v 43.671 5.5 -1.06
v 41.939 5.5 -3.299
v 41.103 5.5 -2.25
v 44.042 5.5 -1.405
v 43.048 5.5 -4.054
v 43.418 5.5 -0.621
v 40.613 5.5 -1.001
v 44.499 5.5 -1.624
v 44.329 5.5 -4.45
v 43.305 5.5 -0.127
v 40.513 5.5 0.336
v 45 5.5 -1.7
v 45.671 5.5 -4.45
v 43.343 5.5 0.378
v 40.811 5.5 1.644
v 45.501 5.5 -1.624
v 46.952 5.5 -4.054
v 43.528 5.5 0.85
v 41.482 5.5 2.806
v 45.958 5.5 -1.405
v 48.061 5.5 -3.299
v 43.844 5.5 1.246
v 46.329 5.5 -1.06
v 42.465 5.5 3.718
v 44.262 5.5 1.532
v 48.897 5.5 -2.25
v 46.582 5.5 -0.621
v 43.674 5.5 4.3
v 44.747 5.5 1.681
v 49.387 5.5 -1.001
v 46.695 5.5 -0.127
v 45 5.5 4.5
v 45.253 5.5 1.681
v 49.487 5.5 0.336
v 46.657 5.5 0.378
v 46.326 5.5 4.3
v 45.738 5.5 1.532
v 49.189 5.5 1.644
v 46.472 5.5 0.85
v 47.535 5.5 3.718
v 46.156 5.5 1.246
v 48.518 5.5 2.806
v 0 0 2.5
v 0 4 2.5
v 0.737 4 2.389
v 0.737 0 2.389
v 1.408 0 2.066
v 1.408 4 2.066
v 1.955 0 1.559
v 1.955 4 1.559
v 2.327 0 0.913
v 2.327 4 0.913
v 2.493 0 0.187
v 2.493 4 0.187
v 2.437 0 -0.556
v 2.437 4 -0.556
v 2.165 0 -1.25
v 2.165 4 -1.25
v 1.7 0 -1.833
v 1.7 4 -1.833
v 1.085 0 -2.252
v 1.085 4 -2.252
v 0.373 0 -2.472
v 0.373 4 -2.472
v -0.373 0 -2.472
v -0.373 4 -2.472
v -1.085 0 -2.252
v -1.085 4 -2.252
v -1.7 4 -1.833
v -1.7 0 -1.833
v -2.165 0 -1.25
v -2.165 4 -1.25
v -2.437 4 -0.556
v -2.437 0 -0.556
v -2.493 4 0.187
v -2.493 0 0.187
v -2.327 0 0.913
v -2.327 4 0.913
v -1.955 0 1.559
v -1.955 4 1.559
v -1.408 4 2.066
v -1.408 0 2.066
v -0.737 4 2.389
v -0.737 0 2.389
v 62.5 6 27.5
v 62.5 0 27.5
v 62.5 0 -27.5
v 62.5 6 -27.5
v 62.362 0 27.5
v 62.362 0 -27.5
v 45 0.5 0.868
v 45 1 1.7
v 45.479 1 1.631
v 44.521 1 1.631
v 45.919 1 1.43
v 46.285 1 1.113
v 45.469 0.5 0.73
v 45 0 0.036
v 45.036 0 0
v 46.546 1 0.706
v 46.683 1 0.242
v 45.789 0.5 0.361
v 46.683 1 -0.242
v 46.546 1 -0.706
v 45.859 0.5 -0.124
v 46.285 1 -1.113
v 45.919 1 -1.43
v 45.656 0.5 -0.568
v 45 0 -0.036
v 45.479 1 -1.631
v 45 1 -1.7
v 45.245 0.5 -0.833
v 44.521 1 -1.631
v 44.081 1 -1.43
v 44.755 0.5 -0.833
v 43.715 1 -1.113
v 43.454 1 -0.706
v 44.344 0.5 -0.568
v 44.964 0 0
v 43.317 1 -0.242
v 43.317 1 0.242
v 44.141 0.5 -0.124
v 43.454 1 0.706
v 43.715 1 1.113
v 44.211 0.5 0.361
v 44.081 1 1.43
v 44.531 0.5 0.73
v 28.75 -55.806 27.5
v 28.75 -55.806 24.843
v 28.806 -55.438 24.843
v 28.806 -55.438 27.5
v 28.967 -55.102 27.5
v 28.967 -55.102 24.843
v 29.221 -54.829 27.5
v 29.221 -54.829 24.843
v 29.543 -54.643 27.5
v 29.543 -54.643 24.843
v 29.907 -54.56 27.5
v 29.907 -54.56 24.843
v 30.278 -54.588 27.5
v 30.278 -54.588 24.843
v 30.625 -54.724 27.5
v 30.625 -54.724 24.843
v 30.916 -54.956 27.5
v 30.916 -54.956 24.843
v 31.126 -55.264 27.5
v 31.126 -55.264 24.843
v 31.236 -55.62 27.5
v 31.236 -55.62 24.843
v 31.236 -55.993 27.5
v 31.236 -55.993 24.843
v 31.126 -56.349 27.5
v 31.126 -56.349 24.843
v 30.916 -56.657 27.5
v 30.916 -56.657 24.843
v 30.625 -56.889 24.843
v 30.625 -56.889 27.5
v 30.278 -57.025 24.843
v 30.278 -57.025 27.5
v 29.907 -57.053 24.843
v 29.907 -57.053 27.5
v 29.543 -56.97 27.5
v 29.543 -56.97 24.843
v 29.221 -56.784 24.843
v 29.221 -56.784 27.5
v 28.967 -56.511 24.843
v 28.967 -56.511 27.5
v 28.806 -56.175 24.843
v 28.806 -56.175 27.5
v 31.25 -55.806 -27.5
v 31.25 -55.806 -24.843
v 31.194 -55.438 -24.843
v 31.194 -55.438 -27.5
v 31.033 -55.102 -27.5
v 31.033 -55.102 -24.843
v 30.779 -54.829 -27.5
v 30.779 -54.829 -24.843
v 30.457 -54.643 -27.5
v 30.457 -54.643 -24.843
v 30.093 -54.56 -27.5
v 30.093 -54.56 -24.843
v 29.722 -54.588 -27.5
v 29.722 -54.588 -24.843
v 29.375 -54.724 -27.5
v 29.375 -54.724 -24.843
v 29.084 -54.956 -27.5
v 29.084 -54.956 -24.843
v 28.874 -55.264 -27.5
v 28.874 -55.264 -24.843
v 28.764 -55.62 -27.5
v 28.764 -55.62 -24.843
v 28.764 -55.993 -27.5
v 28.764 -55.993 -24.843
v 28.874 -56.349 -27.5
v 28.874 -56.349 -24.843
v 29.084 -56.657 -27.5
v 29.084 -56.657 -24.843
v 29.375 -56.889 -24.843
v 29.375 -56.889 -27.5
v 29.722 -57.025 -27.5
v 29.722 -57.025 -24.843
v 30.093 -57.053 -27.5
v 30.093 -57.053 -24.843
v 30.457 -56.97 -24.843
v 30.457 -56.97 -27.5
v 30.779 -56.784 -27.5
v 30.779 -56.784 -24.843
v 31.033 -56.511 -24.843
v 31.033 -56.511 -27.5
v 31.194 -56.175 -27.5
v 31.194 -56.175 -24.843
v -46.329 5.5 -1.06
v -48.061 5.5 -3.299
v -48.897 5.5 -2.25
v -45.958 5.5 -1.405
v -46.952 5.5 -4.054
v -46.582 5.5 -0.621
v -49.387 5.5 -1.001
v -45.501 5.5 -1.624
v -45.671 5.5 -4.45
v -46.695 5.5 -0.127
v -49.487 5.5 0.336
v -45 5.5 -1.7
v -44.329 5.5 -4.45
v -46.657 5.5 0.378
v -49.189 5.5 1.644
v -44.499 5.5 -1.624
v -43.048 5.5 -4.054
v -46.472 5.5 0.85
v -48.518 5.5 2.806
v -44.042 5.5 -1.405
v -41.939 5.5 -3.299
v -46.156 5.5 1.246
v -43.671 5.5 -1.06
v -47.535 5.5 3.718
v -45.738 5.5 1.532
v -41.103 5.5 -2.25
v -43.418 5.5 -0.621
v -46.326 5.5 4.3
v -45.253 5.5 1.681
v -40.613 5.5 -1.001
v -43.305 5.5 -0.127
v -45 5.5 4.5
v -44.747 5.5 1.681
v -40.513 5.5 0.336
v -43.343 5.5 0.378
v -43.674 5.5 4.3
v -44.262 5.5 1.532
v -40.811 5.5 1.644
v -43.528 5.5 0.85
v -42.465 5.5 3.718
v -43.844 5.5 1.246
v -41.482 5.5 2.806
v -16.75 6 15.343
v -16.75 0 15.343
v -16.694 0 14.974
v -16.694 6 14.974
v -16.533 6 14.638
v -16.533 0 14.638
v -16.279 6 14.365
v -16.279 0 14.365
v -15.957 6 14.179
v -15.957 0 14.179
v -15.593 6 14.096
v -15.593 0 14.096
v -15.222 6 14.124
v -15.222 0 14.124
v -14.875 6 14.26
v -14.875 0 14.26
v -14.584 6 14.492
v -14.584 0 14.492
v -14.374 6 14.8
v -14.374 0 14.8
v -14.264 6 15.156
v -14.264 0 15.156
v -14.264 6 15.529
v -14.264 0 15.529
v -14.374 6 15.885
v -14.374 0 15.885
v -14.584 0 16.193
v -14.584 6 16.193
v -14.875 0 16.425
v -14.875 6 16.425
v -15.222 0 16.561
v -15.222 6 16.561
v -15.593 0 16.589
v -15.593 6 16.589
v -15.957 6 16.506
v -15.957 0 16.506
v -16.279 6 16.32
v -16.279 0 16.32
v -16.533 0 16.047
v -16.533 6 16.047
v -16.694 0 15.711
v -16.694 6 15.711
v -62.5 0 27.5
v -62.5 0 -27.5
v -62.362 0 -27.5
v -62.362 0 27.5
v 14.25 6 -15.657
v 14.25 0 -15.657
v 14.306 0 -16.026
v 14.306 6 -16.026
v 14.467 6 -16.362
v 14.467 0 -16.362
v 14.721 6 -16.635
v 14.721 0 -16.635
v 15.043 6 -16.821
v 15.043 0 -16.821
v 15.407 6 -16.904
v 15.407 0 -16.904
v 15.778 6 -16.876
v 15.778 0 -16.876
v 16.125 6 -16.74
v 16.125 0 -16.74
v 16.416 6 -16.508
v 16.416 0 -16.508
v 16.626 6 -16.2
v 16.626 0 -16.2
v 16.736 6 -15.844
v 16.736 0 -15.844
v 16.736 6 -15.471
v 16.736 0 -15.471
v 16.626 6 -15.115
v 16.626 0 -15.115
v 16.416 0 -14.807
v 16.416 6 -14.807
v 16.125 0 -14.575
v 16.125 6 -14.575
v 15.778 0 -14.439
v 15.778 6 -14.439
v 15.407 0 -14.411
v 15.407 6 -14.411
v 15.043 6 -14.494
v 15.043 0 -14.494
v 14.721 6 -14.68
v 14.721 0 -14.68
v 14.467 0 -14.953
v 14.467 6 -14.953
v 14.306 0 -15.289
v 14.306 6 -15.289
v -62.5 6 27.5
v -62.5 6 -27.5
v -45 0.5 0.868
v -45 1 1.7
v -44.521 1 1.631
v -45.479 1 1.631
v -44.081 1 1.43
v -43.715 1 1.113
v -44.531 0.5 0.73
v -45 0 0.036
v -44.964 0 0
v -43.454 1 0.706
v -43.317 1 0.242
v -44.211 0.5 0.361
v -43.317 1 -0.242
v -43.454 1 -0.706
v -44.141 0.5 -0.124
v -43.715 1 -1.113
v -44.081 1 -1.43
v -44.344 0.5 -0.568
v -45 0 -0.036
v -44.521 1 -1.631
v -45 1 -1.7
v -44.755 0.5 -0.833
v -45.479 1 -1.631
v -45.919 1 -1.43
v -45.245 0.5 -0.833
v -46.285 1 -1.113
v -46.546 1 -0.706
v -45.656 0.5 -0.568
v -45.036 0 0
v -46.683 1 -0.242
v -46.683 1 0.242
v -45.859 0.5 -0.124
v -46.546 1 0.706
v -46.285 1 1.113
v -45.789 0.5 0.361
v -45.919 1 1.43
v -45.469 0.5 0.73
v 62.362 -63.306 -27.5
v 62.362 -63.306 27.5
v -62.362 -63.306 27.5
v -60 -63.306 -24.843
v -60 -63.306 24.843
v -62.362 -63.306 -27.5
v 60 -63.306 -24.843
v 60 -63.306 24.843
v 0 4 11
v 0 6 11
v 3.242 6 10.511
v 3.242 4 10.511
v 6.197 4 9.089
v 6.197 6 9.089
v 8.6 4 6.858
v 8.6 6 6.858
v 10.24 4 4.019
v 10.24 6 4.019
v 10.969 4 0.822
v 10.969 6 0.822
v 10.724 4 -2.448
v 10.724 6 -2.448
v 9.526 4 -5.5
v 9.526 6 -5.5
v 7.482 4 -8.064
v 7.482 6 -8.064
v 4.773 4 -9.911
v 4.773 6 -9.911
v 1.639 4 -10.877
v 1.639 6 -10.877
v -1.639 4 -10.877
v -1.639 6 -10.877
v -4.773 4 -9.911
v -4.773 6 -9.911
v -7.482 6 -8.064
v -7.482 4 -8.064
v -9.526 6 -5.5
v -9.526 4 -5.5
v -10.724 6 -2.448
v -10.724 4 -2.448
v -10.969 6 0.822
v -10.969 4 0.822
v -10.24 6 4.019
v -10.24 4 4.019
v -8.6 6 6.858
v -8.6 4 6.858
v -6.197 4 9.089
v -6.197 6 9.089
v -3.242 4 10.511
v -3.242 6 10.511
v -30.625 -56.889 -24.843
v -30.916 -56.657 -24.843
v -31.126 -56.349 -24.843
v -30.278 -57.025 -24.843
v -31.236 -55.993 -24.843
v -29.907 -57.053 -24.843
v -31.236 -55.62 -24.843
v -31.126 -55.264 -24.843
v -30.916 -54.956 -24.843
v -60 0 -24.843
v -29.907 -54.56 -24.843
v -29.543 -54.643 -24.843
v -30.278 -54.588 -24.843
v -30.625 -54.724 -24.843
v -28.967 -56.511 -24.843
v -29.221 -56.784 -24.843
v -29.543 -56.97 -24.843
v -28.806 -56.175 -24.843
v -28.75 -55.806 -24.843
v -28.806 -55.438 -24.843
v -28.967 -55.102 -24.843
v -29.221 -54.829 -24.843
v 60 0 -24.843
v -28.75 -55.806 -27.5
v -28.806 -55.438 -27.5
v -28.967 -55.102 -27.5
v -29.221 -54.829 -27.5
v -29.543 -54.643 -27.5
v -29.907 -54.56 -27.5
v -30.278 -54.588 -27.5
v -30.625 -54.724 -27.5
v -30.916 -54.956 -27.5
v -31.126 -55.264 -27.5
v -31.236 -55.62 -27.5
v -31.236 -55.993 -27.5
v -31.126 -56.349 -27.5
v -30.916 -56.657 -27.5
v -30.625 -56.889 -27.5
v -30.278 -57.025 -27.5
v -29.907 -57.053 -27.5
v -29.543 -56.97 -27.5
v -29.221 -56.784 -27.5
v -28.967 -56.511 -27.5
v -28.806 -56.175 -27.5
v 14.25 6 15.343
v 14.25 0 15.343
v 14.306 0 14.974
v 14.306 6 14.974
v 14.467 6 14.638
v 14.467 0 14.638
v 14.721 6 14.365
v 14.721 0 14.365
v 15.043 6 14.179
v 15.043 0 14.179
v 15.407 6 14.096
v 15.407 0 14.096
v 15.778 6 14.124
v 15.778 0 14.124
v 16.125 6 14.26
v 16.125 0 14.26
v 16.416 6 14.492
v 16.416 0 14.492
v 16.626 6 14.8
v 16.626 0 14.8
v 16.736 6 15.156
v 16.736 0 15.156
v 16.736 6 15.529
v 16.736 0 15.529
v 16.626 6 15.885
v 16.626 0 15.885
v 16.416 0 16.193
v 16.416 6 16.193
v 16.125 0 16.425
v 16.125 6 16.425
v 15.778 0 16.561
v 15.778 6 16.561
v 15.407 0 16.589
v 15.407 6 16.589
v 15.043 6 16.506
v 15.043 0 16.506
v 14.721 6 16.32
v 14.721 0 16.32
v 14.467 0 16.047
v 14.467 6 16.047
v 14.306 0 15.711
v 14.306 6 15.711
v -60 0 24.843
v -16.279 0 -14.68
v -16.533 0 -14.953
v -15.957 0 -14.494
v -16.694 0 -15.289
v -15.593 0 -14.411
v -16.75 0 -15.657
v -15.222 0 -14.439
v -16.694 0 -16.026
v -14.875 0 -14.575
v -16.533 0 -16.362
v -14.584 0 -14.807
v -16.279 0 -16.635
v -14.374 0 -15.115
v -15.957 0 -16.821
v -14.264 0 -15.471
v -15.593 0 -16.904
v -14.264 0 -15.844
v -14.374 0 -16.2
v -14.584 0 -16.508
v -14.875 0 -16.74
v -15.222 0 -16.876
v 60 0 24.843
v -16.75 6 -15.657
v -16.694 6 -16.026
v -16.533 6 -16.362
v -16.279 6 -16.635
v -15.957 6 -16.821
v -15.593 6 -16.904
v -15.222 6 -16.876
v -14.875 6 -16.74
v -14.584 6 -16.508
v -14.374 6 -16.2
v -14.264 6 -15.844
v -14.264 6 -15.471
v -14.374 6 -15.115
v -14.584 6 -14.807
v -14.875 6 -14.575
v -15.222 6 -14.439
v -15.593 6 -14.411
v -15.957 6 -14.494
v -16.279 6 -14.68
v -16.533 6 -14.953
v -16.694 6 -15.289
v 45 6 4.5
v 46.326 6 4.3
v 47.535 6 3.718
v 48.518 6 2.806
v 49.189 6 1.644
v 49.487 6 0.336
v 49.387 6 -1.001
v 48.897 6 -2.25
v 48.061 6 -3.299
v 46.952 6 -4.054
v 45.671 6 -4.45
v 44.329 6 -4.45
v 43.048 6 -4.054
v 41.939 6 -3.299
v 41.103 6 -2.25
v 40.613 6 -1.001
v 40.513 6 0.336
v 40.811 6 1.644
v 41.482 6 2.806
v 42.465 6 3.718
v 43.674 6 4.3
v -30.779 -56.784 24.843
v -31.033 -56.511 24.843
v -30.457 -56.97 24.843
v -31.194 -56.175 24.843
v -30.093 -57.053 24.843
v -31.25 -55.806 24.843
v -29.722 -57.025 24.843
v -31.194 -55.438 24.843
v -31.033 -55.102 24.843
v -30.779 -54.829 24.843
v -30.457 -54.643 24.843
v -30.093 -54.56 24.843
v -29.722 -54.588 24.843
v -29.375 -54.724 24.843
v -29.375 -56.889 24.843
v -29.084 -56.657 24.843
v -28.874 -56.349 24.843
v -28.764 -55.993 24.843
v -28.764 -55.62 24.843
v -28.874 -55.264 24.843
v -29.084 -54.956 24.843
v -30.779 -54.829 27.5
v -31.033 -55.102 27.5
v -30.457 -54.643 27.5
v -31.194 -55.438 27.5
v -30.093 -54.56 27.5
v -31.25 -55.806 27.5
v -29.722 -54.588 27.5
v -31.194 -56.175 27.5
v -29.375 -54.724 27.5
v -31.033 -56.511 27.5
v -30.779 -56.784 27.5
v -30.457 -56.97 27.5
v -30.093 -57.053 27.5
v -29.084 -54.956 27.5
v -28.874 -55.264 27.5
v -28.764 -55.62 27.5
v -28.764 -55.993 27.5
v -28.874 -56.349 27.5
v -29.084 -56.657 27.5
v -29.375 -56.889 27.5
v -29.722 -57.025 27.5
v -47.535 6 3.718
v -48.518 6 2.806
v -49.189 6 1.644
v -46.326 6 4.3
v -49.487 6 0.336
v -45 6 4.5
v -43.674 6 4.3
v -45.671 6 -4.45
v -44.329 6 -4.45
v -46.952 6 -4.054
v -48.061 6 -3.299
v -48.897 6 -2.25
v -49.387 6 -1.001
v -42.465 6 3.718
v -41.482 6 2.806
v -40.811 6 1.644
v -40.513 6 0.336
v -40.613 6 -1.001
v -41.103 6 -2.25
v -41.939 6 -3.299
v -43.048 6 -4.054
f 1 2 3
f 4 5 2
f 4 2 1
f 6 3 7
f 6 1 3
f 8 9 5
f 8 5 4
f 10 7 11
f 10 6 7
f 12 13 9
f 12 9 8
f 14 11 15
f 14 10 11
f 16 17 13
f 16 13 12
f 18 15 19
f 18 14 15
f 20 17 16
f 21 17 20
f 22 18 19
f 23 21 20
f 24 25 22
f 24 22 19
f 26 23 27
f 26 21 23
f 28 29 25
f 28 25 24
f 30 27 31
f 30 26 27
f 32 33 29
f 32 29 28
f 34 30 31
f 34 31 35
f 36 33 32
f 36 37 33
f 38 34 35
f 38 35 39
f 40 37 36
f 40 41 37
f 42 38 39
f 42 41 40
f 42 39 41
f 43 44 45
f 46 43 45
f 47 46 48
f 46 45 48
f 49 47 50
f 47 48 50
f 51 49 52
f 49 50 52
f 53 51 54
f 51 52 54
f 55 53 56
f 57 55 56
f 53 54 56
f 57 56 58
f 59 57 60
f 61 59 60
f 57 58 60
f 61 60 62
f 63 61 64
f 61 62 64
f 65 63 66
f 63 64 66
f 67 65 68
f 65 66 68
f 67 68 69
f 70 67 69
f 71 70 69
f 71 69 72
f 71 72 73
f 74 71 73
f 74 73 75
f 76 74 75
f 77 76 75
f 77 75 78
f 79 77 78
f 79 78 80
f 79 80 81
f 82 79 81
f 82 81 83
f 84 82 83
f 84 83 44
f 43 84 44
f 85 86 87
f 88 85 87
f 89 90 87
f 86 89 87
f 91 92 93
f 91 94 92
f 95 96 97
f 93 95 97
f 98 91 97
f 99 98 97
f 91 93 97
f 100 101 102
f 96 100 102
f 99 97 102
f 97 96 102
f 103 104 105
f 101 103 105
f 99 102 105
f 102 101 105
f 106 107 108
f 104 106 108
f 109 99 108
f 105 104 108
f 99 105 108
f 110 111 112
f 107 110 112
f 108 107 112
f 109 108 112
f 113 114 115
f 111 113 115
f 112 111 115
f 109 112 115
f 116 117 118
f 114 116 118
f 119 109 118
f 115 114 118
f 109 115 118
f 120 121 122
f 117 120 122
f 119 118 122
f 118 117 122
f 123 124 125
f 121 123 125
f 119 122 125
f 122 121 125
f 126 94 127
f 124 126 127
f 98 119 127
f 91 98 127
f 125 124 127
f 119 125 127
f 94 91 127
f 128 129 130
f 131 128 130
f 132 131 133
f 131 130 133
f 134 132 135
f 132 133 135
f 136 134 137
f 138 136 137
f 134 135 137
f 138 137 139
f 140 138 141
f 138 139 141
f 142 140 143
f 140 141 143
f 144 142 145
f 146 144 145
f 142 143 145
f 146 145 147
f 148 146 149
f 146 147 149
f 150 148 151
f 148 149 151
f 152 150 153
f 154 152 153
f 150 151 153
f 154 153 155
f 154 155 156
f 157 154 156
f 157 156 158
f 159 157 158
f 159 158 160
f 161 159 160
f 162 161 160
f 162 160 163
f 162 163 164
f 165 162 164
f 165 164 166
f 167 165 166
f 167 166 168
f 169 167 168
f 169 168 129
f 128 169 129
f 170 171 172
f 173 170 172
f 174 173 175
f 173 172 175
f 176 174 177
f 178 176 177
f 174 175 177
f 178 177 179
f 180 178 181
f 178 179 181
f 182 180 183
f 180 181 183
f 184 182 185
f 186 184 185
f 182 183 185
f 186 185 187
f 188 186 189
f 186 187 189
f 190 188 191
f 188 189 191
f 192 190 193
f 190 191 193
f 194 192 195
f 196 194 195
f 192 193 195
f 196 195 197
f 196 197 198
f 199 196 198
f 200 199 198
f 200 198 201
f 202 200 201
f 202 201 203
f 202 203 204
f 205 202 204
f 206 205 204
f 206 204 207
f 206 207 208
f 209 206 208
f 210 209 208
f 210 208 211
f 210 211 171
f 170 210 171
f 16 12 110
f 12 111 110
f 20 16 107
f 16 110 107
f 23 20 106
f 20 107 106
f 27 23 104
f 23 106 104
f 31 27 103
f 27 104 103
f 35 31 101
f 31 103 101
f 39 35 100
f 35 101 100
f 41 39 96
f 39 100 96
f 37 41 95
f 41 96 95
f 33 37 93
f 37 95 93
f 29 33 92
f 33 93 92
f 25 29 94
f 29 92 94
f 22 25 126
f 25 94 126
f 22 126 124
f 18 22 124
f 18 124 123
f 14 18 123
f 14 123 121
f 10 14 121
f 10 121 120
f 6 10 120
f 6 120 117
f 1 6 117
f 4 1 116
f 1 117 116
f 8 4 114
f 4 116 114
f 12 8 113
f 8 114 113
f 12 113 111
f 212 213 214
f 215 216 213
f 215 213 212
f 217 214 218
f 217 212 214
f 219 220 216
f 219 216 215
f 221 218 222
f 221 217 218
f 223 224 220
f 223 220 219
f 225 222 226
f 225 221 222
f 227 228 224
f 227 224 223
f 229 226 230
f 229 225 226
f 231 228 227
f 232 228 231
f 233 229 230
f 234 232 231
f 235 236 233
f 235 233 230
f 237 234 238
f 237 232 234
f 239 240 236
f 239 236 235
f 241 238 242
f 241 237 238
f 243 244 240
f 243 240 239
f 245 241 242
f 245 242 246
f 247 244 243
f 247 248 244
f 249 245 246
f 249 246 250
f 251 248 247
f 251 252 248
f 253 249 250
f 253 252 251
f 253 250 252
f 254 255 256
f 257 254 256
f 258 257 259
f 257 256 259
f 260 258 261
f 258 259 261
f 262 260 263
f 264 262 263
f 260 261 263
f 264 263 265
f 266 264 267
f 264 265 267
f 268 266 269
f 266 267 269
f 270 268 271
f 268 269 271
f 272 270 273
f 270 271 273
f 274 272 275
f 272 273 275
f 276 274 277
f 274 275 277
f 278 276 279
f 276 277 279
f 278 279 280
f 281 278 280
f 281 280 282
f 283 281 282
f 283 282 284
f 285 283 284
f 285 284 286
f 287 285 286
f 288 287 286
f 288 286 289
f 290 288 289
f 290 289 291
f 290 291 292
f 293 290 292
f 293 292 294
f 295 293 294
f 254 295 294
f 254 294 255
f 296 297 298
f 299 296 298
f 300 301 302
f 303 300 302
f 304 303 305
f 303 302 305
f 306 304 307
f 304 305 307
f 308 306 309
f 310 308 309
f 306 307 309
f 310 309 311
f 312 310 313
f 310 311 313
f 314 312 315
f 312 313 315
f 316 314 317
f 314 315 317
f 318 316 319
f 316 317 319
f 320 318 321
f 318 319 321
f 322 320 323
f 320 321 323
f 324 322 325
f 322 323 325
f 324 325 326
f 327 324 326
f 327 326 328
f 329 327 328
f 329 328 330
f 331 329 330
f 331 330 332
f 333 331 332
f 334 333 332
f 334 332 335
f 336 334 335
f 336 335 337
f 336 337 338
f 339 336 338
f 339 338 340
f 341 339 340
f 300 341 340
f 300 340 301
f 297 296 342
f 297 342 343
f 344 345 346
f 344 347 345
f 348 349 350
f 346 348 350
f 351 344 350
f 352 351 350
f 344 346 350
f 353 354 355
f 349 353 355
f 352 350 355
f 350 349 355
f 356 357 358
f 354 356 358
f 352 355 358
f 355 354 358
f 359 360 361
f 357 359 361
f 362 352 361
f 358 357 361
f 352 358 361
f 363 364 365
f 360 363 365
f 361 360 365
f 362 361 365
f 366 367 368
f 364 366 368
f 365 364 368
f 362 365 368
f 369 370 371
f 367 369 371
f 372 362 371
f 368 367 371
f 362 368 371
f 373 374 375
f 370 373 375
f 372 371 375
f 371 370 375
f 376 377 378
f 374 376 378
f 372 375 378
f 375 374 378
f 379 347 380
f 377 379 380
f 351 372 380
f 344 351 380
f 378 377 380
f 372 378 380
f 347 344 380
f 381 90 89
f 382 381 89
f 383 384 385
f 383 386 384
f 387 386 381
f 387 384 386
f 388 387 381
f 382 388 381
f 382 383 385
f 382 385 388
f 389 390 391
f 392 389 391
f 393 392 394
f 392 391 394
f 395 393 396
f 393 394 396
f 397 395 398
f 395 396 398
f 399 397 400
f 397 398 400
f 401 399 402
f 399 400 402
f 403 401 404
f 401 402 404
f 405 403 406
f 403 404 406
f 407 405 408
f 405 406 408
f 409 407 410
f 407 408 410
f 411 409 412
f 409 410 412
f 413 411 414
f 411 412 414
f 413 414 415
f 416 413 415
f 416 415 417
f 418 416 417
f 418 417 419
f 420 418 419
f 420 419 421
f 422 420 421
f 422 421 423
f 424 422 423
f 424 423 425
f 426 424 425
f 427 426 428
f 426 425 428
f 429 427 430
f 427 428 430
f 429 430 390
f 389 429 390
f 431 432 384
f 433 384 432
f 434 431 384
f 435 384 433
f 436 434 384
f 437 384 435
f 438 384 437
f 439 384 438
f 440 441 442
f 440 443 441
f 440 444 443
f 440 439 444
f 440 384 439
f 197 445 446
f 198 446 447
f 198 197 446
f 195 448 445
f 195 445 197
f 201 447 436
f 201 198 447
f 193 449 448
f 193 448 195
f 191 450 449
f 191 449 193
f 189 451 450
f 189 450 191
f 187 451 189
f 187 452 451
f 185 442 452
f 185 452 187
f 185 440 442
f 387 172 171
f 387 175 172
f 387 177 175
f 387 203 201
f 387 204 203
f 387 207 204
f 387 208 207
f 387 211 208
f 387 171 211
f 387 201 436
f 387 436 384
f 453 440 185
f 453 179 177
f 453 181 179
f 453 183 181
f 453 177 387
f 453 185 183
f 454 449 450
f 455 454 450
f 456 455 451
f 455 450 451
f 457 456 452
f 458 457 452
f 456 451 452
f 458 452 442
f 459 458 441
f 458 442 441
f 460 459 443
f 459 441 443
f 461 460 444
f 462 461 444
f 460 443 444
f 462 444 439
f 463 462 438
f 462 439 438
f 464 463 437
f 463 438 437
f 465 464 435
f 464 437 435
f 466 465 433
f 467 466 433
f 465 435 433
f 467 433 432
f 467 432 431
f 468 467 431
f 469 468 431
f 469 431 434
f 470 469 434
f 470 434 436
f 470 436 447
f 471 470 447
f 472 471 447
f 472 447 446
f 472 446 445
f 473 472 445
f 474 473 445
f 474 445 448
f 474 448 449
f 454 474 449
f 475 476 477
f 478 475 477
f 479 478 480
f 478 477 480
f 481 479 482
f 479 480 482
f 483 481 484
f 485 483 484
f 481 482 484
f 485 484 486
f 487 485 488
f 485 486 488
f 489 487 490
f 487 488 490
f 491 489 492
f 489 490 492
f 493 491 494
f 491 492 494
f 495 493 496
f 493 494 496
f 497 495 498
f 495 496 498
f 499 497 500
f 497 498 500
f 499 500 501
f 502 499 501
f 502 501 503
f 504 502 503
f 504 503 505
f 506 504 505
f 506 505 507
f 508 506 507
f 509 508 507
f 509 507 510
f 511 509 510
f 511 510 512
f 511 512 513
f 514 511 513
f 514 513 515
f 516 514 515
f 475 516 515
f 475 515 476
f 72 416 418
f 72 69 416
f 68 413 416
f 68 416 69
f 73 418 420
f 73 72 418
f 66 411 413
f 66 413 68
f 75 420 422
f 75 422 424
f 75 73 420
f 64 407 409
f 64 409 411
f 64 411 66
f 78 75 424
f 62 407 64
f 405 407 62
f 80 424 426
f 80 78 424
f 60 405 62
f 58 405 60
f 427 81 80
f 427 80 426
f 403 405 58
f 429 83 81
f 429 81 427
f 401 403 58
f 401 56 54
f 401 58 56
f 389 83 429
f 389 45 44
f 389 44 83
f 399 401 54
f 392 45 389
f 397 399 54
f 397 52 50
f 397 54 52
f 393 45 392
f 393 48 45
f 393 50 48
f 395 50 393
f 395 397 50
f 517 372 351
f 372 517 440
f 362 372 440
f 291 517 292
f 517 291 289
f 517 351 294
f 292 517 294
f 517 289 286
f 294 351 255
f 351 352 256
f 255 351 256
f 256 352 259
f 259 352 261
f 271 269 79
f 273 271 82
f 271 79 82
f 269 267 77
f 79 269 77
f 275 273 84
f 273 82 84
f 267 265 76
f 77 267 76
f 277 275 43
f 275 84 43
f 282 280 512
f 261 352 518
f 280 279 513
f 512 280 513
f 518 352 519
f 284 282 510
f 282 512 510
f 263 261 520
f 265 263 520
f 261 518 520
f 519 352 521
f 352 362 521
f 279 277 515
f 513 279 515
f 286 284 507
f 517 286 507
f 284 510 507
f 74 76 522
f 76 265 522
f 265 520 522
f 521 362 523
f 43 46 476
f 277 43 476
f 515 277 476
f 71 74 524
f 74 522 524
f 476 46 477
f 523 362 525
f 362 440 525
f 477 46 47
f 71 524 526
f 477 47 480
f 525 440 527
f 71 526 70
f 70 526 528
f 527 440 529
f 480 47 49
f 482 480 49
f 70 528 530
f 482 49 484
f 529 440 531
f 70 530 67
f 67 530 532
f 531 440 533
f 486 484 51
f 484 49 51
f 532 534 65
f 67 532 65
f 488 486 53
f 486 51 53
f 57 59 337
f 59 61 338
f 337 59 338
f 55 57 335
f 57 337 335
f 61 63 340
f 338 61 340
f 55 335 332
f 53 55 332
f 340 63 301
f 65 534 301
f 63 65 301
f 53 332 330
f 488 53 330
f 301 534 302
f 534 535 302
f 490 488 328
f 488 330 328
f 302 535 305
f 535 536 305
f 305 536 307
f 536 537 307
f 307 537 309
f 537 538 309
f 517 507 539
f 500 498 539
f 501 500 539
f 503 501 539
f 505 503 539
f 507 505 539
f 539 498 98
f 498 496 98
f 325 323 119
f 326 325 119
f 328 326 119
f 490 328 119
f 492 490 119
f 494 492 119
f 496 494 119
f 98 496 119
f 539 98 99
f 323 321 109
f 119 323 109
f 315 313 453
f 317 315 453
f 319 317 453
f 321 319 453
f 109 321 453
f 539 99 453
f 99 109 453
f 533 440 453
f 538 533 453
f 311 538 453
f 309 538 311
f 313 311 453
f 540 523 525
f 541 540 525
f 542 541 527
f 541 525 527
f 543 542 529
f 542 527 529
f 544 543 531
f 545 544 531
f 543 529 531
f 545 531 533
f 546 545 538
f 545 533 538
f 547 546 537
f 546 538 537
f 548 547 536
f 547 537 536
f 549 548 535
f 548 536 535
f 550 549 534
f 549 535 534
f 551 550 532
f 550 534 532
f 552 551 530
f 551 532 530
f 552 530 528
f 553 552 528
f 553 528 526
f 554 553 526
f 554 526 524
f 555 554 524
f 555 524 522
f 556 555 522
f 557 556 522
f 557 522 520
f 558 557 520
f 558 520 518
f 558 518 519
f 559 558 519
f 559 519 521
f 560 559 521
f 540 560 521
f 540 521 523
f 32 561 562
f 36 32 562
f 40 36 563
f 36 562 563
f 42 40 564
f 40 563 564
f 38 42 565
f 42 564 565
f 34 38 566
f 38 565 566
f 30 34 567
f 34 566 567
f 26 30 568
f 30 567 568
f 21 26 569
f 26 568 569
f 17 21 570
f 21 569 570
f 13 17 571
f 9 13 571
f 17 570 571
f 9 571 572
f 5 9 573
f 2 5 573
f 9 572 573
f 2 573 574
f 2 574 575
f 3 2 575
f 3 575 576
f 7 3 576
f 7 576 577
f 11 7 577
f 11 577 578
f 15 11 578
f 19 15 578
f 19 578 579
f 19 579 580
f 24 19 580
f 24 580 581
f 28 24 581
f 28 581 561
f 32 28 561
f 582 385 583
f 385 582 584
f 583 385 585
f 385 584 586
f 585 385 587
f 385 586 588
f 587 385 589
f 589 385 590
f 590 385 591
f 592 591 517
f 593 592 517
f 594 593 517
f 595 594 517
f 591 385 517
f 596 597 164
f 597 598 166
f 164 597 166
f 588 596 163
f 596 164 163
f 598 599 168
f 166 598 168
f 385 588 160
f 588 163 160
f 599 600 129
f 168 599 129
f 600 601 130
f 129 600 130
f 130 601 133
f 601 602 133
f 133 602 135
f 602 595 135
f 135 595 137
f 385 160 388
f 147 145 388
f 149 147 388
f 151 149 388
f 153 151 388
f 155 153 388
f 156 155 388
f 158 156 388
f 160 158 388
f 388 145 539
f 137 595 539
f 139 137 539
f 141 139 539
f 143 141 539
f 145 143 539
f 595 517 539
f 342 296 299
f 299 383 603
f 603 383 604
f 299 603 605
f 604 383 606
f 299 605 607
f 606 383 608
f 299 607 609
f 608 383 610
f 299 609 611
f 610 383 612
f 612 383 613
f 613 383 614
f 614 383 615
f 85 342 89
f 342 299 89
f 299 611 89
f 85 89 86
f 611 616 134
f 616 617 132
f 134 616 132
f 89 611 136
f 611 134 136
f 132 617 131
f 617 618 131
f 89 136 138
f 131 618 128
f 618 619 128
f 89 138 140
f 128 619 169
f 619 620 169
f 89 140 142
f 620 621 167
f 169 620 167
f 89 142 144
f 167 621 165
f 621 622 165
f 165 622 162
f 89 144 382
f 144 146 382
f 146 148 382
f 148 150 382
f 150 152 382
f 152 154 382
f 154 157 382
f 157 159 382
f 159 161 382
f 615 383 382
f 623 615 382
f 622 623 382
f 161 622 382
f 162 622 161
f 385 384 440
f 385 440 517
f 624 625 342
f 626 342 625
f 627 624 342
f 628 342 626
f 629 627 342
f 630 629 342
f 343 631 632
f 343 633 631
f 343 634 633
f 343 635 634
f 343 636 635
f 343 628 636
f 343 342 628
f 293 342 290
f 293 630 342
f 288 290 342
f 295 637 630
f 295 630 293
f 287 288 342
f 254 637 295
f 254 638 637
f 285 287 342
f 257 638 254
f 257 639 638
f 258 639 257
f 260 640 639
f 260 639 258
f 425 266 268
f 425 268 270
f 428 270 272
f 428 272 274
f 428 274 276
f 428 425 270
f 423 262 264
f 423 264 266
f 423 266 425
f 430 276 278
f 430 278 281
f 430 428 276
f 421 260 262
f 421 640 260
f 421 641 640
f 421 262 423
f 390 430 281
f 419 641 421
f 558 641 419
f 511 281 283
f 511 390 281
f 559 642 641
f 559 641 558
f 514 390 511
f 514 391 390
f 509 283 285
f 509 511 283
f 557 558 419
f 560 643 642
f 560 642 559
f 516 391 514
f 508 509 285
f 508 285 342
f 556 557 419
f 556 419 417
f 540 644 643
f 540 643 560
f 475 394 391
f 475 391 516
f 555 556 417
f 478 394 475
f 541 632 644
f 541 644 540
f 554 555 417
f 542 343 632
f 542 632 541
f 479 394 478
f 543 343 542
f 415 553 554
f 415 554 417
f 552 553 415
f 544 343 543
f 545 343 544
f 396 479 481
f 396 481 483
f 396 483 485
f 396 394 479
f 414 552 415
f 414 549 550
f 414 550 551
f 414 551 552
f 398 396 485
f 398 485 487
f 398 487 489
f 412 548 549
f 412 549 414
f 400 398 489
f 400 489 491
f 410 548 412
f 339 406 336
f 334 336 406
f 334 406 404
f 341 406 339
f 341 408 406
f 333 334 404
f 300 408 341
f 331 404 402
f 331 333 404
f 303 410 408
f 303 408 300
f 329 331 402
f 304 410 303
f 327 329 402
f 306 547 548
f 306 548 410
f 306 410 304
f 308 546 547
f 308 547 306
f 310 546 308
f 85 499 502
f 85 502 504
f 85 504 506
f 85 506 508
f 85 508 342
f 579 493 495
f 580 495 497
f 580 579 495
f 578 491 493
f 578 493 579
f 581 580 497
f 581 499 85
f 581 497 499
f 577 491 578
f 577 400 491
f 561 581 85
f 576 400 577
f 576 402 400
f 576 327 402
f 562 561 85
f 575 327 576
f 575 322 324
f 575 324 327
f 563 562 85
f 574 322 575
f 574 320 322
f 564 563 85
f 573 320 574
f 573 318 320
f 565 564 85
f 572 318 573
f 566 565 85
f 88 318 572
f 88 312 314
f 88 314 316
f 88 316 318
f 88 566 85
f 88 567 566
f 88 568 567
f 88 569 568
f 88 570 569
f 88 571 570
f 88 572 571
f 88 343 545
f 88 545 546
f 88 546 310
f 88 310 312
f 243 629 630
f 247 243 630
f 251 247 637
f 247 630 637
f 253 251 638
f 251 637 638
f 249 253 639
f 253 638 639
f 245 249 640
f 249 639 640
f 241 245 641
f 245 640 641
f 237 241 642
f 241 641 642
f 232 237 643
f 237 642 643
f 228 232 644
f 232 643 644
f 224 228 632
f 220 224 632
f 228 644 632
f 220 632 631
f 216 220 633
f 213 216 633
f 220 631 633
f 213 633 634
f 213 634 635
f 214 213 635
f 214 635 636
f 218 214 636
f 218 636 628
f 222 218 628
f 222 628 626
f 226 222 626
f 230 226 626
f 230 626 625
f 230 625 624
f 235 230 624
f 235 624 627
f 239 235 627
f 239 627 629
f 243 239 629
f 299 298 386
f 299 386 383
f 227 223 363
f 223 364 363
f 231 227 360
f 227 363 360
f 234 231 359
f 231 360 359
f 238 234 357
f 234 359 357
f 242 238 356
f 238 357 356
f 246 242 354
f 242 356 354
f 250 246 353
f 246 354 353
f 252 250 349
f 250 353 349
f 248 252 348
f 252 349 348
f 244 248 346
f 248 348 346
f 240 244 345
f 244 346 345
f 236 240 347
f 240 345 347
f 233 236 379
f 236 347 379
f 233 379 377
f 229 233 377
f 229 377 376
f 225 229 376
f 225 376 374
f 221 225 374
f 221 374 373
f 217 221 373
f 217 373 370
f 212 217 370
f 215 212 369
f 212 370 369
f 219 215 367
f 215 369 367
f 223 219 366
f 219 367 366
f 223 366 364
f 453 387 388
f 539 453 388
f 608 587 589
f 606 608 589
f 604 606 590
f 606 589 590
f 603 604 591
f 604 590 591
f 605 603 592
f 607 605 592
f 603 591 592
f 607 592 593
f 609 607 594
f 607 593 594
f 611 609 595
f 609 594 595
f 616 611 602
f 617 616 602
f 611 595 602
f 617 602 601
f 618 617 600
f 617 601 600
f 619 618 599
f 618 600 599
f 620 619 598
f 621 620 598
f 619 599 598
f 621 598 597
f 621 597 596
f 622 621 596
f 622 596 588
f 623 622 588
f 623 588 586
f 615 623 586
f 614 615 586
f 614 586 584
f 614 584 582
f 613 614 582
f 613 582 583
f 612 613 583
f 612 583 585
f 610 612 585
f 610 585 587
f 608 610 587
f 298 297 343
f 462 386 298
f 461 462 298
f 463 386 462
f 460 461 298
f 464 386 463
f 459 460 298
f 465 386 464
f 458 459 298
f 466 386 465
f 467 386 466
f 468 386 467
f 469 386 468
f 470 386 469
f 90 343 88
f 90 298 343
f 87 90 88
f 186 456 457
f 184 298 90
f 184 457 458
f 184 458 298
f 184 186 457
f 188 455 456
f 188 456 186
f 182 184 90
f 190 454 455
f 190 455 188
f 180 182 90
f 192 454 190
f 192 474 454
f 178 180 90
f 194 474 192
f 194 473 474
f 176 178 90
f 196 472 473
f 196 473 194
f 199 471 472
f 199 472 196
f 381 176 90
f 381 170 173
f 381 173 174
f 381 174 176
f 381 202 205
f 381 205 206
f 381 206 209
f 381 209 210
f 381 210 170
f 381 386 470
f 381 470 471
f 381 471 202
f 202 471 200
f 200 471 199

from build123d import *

# Parameters (mm, degrees)
SKETCH_1_W                     = 125
SKETCH_1_H                     = 55
EXTRUDE_1_DEPTH                = 6
SKETCH_2_R                     = 11
CUT_EXTRUDE_1_DEPTH            = 2
CUT_EXTRUDE_2_REACH            = 70.4
SKETCH_3_R                     = 2.5
HOLE_WIZARD_M3_1_D             = 2.5
HOLE_WIZARD_M3_1_DEPTH         = 7.5
HOLE_WIZARD_M3_1_TIP           = 0.751075774
SKETCH_6_W                     = 124.723991502
SKETCH_6_H                     = 55
SKETCH_6_W_2                   = 120
SKETCH_6_H_2                   = 49.685135096
EXTRUDE_2_DEPTH                = 63.306419
HOLE_WIZARD_M3_2_D             = 2.5
HOLE_WIZARD_M3_2_DEPTH         = 2.657432452
HOLE_WIZARD_M3_3_D             = 2.5
HOLE_WIZARD_M3_1_2_D           = 3.4
HOLE_WIZARD_M3_1_2_DEPTH       = 5
HOLE_WIZARD_M3_1_2_CBORE_D     = 9
HOLE_WIZARD_M3_1_2_CBORE_DEPTH = 0.5
HOLE_WIZARD_M3_1_2_TIP         = 1.021463052


with BuildPart() as part:
    # 草图1 → 凸台-拉伸1 (new body)
    with BuildSketch(Plane(origin=(0, 0, 0), x_dir=(1, 0, 0), z_dir=(0, 1, 0))):
        Rectangle(SKETCH_1_W, SKETCH_1_H)
    extrude(amount=EXTRUDE_1_DEPTH)

    # 草图2 → 切除-拉伸1 (cut)
    with BuildSketch(Plane(origin=(0, 6, 0), x_dir=(1, 0, 0), z_dir=(0, 1, 0))):
        with Locations(Location((0, 0, 0), (0, 0, 270))):
            Circle(SKETCH_2_R)
    extrude(amount=-CUT_EXTRUDE_1_DEPTH, mode=Mode.SUBTRACT)

    # 草图3 → 切除-拉伸2 (cut, up to next)
    with BuildSketch(Plane(origin=(0, 4, 0), x_dir=(1, 0, 0), z_dir=(0, 1, 0)), mode=Mode.PRIVATE) as cut_extrude_2_sk1:
        with Locations(Location((0, 0, 0), (0, 0, 270))):
            Circle(SKETCH_3_R)
    cut_extrude_2_tool1 = extrude(cut_extrude_2_sk1.sketch, amount=-CUT_EXTRUDE_2_REACH, mode=Mode.PRIVATE) & part.part
    add(cut_extrude_2_tool1.solids().sort_by_distance((0, 4, 0))[0], mode=Mode.SUBTRACT)

    # Hole Wizard M3 _1
    with Locations(Plane(origin=(0, 6, 0), x_dir=(1, 0, 0), z_dir=(0, 1, 0))):
        with Locations((15.5, 15.657432452), (15.5, -15.342567548), (-15.5, -15.342567548), (-15.5, 15.657432452)):
            Hole(HOLE_WIZARD_M3_1_D / 2, depth=HOLE_WIZARD_M3_1_DEPTH)
            with Locations((0, 0, -(HOLE_WIZARD_M3_1_DEPTH + HOLE_WIZARD_M3_1_TIP / 2))):  # 118° drill point
                Cone(0, HOLE_WIZARD_M3_1_D / 2, HOLE_WIZARD_M3_1_TIP, mode=Mode.SUBTRACT)

    # 草图6 → 凸台-拉伸2 (add)
    with BuildSketch(Plane.XZ):
        Rectangle(SKETCH_6_W, SKETCH_6_H)
        Rectangle(SKETCH_6_W_2, SKETCH_6_H_2, mode=Mode.SUBTRACT)
    extrude(amount=EXTRUDE_2_DEPTH)

    # M3 螺纹孔2
    with Locations(Plane(origin=(0, 0, -27.5), x_dir=(-1, 0, 0), z_dir=(0, 0, -1))):
        with Locations((30, -55.806419172), (-30, -55.806419172)):
            Hole(HOLE_WIZARD_M3_2_D / 2, depth=HOLE_WIZARD_M3_2_DEPTH)

    # M3 螺纹孔3 (through all)
    with Locations(Plane.XY.offset(27.5)):
        with Locations((30, -55.806419172), (-30, -55.806419172)):
            Hole(HOLE_WIZARD_M3_3_D / 2)

    # Hole Wizard M3 _1 2
    with Locations(Plane(origin=(-45, 6, 0), x_dir=(0, 0, 1), z_dir=(0, 1, 0))):
        with Locations((0, 0), (0, 90)):
            CounterBoreHole(HOLE_WIZARD_M3_1_2_D / 2, HOLE_WIZARD_M3_1_2_CBORE_D / 2, HOLE_WIZARD_M3_1_2_CBORE_DEPTH, depth=HOLE_WIZARD_M3_1_2_DEPTH)
            with Locations((0, 0, -(HOLE_WIZARD_M3_1_2_DEPTH + HOLE_WIZARD_M3_1_2_TIP / 2))):  # 118° drill point
                Cone(0, HOLE_WIZARD_M3_1_2_D / 2, HOLE_WIZARD_M3_1_2_TIP, mode=Mode.SUBTRACT)


solid = part.part
